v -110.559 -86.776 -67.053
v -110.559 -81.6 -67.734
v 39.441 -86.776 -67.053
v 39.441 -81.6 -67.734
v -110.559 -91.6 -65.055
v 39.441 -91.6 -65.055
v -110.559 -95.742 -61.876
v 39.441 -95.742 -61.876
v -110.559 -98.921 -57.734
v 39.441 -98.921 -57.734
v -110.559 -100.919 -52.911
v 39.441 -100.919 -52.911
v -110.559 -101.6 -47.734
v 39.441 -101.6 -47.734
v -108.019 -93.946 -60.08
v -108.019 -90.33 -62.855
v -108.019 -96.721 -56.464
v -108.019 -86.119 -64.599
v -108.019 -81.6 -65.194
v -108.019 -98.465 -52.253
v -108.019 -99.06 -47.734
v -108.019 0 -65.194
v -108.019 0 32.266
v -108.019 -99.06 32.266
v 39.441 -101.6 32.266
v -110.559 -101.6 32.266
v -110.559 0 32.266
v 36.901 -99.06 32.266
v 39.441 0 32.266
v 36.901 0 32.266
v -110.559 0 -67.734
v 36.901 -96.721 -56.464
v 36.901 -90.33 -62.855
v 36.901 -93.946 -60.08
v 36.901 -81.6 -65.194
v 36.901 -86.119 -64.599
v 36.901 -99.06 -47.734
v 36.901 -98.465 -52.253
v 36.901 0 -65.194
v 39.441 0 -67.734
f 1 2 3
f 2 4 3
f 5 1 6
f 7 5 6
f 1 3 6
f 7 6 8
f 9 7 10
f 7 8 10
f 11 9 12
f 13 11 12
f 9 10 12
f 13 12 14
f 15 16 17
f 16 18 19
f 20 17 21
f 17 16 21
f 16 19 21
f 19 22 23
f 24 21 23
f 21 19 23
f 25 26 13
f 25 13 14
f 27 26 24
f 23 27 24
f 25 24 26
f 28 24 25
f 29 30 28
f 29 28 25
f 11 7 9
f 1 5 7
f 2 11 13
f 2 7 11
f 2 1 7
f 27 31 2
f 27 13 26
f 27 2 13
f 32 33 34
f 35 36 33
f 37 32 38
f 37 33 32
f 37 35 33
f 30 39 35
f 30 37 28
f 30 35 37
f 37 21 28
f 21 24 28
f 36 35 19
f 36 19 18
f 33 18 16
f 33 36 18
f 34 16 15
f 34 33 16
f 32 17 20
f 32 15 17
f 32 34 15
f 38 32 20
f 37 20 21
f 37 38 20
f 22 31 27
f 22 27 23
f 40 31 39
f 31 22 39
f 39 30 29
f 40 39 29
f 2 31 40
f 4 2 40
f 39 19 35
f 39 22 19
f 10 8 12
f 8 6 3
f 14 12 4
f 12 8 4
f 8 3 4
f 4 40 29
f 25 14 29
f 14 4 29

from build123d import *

# Parameters (mm, degrees)
F0_W     = 150
F0_H     = 100
F1_DEPTH = 101.6
F2_R     = 20
F3_T     = -2.54


with BuildPart() as f1:
    # F0 (on Front) → F1 (new body)
    with BuildSketch(Plane.XZ):
        with Locations((-35.558602, -17.734206)):
            Rectangle(F0_W, F0_H)
    extrude(amount=F1_DEPTH)

    # F2
    f2_edges = [f1.edges().sort_by_distance(p)[0] for p in [
        (-35.558602, -101.6, -67.734206),
    ]]
    fillet(f2_edges, radius=F2_R)

    # F3
    f3_openings = [f1.faces().sort_by_distance(p)[0] for p in [
        (-35.558602, 0, -17.734206),
        (-35.558602, -50.8, 32.265794),
    ]]
    offset(amount=F3_T, openings=f3_openings)


solid = f1.part
